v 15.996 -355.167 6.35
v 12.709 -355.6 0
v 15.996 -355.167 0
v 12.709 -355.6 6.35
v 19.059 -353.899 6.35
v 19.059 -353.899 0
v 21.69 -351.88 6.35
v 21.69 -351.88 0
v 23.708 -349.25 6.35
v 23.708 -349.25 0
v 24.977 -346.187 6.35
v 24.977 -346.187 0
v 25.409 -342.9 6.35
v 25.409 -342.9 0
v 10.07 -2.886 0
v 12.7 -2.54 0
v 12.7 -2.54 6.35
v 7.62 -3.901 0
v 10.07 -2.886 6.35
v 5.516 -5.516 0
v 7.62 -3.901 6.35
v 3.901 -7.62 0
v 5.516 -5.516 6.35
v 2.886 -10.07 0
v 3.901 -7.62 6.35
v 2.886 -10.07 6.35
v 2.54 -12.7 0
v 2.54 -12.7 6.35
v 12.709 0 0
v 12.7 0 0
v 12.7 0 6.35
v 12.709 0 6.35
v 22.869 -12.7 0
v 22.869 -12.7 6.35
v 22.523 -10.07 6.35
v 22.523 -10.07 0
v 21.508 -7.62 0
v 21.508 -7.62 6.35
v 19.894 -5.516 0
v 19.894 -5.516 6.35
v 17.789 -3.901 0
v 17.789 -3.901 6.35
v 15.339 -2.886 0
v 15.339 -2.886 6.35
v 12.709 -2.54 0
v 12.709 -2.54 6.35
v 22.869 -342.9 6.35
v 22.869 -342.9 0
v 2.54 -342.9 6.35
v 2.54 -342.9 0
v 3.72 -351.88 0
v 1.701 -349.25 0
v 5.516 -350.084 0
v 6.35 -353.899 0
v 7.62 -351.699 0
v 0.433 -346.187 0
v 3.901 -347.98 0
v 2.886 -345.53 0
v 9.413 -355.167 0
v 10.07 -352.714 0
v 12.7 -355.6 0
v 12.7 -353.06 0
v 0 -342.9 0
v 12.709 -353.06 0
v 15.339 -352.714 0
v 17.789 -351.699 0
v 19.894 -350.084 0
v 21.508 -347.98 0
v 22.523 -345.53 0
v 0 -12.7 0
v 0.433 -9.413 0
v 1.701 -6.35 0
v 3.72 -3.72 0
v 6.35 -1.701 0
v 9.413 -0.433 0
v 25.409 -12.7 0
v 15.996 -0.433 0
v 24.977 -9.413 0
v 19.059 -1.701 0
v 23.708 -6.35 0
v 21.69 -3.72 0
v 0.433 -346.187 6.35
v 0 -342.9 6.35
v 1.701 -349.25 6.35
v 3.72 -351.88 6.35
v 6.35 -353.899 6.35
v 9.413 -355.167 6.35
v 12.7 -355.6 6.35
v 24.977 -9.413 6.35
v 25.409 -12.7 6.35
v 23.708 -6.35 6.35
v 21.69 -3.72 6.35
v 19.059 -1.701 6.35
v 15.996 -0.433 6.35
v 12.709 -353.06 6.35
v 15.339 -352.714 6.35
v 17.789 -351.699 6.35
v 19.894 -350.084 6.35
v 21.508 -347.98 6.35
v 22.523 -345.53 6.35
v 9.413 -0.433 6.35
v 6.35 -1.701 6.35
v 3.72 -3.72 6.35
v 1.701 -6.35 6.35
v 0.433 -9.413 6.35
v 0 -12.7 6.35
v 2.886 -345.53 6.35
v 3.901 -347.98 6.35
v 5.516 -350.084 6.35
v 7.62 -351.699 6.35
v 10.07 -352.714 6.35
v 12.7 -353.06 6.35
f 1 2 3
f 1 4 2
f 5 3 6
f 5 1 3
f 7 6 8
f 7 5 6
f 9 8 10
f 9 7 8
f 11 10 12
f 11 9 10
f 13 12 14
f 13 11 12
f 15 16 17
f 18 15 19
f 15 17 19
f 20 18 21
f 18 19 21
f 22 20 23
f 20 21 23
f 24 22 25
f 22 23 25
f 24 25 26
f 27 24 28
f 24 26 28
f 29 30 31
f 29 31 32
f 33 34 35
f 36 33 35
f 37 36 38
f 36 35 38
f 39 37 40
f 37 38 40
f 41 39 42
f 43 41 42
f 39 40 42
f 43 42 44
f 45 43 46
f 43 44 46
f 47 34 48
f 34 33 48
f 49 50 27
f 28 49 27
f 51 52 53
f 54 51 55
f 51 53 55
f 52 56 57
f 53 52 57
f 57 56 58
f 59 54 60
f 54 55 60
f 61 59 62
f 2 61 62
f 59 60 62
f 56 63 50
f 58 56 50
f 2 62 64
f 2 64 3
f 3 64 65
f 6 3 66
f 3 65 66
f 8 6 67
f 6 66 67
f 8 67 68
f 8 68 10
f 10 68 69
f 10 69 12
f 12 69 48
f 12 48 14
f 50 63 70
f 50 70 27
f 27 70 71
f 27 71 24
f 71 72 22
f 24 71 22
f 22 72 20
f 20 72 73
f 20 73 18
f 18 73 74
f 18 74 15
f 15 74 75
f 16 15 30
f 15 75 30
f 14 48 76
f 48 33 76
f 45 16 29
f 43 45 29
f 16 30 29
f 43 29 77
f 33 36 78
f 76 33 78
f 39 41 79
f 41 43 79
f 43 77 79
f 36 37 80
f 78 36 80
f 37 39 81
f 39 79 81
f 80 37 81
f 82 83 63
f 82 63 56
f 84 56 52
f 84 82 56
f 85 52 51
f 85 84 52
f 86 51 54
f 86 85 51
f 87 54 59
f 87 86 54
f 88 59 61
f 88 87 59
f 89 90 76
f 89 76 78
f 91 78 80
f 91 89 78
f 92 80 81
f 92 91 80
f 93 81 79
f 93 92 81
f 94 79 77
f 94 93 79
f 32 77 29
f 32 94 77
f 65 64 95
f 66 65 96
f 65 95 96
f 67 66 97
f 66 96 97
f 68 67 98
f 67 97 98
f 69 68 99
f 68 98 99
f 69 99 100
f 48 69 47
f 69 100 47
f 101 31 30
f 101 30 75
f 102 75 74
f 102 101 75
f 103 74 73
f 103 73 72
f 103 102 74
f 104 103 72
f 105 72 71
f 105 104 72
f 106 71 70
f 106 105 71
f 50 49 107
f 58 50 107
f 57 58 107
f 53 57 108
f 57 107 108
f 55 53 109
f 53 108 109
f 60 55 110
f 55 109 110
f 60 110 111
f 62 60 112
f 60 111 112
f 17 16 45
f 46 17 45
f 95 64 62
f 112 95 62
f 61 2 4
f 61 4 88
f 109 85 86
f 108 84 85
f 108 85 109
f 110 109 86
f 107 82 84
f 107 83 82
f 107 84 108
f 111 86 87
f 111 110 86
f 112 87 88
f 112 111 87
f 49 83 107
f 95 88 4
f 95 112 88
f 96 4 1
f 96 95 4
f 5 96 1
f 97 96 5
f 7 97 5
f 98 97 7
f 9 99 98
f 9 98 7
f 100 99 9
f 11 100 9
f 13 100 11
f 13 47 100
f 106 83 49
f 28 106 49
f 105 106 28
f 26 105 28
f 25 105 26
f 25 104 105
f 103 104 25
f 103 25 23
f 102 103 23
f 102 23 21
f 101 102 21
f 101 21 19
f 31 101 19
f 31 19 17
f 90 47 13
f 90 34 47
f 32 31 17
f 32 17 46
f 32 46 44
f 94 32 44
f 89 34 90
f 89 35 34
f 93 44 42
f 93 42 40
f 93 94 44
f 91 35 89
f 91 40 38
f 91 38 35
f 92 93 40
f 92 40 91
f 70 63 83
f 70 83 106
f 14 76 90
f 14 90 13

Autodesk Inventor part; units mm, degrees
ref_plane "YZ Plane" through (0, 0, 0) normal (1, 0, 0) x (0, 1, 0)
ref_plane "XZ Plane" through (0, 0, 0) normal (0, 1, 0) x (-1, 0, 0)
ref_plane "XY Plane" through (0, 0, 0) normal (0, 0, 1) x (1, 0, 0)
sketch "Sketch1" plane through (0, 0, 0) normal (0, 0, 1) x (1, 0, 0)
  line L0 (0, 0) -> (25.4094, 0)
  line L1 (25.4094, 0) -> (25.4094, -355.6)
  line L2 (25.4094, -355.6) -> (0, -355.6)
  line L3 (0, -355.6) -> (0, 0)
  dimension "d0" = 355.6
extrude "Extrusion1" add sketch "Sketch1" along normal blind 6.35
fillet "Fillet1" radius 12.7 1 edges at (0, 0, 3.175)
fillet "Fillet2" radius 12.7 1 edges at (25.4094, 0, 3.175)
fillet "Fillet3" radius 12.7 1 edges at (25.4094, -355.6, 3.175)
fillet "Fillet4" radius 12.7 1 edges at (0, -355.6, 3.175)
shell "Shell1" thickness 2.54 removed faces 1 at (8.4698, -122.7667, 0)
shell "Shell2" thickness 2.54 removed faces 2 at (9.3165, -122.7667, 3.81) at (8.4698, -122.7667, 6.35)
properties part number "LiftWireLine14in"
